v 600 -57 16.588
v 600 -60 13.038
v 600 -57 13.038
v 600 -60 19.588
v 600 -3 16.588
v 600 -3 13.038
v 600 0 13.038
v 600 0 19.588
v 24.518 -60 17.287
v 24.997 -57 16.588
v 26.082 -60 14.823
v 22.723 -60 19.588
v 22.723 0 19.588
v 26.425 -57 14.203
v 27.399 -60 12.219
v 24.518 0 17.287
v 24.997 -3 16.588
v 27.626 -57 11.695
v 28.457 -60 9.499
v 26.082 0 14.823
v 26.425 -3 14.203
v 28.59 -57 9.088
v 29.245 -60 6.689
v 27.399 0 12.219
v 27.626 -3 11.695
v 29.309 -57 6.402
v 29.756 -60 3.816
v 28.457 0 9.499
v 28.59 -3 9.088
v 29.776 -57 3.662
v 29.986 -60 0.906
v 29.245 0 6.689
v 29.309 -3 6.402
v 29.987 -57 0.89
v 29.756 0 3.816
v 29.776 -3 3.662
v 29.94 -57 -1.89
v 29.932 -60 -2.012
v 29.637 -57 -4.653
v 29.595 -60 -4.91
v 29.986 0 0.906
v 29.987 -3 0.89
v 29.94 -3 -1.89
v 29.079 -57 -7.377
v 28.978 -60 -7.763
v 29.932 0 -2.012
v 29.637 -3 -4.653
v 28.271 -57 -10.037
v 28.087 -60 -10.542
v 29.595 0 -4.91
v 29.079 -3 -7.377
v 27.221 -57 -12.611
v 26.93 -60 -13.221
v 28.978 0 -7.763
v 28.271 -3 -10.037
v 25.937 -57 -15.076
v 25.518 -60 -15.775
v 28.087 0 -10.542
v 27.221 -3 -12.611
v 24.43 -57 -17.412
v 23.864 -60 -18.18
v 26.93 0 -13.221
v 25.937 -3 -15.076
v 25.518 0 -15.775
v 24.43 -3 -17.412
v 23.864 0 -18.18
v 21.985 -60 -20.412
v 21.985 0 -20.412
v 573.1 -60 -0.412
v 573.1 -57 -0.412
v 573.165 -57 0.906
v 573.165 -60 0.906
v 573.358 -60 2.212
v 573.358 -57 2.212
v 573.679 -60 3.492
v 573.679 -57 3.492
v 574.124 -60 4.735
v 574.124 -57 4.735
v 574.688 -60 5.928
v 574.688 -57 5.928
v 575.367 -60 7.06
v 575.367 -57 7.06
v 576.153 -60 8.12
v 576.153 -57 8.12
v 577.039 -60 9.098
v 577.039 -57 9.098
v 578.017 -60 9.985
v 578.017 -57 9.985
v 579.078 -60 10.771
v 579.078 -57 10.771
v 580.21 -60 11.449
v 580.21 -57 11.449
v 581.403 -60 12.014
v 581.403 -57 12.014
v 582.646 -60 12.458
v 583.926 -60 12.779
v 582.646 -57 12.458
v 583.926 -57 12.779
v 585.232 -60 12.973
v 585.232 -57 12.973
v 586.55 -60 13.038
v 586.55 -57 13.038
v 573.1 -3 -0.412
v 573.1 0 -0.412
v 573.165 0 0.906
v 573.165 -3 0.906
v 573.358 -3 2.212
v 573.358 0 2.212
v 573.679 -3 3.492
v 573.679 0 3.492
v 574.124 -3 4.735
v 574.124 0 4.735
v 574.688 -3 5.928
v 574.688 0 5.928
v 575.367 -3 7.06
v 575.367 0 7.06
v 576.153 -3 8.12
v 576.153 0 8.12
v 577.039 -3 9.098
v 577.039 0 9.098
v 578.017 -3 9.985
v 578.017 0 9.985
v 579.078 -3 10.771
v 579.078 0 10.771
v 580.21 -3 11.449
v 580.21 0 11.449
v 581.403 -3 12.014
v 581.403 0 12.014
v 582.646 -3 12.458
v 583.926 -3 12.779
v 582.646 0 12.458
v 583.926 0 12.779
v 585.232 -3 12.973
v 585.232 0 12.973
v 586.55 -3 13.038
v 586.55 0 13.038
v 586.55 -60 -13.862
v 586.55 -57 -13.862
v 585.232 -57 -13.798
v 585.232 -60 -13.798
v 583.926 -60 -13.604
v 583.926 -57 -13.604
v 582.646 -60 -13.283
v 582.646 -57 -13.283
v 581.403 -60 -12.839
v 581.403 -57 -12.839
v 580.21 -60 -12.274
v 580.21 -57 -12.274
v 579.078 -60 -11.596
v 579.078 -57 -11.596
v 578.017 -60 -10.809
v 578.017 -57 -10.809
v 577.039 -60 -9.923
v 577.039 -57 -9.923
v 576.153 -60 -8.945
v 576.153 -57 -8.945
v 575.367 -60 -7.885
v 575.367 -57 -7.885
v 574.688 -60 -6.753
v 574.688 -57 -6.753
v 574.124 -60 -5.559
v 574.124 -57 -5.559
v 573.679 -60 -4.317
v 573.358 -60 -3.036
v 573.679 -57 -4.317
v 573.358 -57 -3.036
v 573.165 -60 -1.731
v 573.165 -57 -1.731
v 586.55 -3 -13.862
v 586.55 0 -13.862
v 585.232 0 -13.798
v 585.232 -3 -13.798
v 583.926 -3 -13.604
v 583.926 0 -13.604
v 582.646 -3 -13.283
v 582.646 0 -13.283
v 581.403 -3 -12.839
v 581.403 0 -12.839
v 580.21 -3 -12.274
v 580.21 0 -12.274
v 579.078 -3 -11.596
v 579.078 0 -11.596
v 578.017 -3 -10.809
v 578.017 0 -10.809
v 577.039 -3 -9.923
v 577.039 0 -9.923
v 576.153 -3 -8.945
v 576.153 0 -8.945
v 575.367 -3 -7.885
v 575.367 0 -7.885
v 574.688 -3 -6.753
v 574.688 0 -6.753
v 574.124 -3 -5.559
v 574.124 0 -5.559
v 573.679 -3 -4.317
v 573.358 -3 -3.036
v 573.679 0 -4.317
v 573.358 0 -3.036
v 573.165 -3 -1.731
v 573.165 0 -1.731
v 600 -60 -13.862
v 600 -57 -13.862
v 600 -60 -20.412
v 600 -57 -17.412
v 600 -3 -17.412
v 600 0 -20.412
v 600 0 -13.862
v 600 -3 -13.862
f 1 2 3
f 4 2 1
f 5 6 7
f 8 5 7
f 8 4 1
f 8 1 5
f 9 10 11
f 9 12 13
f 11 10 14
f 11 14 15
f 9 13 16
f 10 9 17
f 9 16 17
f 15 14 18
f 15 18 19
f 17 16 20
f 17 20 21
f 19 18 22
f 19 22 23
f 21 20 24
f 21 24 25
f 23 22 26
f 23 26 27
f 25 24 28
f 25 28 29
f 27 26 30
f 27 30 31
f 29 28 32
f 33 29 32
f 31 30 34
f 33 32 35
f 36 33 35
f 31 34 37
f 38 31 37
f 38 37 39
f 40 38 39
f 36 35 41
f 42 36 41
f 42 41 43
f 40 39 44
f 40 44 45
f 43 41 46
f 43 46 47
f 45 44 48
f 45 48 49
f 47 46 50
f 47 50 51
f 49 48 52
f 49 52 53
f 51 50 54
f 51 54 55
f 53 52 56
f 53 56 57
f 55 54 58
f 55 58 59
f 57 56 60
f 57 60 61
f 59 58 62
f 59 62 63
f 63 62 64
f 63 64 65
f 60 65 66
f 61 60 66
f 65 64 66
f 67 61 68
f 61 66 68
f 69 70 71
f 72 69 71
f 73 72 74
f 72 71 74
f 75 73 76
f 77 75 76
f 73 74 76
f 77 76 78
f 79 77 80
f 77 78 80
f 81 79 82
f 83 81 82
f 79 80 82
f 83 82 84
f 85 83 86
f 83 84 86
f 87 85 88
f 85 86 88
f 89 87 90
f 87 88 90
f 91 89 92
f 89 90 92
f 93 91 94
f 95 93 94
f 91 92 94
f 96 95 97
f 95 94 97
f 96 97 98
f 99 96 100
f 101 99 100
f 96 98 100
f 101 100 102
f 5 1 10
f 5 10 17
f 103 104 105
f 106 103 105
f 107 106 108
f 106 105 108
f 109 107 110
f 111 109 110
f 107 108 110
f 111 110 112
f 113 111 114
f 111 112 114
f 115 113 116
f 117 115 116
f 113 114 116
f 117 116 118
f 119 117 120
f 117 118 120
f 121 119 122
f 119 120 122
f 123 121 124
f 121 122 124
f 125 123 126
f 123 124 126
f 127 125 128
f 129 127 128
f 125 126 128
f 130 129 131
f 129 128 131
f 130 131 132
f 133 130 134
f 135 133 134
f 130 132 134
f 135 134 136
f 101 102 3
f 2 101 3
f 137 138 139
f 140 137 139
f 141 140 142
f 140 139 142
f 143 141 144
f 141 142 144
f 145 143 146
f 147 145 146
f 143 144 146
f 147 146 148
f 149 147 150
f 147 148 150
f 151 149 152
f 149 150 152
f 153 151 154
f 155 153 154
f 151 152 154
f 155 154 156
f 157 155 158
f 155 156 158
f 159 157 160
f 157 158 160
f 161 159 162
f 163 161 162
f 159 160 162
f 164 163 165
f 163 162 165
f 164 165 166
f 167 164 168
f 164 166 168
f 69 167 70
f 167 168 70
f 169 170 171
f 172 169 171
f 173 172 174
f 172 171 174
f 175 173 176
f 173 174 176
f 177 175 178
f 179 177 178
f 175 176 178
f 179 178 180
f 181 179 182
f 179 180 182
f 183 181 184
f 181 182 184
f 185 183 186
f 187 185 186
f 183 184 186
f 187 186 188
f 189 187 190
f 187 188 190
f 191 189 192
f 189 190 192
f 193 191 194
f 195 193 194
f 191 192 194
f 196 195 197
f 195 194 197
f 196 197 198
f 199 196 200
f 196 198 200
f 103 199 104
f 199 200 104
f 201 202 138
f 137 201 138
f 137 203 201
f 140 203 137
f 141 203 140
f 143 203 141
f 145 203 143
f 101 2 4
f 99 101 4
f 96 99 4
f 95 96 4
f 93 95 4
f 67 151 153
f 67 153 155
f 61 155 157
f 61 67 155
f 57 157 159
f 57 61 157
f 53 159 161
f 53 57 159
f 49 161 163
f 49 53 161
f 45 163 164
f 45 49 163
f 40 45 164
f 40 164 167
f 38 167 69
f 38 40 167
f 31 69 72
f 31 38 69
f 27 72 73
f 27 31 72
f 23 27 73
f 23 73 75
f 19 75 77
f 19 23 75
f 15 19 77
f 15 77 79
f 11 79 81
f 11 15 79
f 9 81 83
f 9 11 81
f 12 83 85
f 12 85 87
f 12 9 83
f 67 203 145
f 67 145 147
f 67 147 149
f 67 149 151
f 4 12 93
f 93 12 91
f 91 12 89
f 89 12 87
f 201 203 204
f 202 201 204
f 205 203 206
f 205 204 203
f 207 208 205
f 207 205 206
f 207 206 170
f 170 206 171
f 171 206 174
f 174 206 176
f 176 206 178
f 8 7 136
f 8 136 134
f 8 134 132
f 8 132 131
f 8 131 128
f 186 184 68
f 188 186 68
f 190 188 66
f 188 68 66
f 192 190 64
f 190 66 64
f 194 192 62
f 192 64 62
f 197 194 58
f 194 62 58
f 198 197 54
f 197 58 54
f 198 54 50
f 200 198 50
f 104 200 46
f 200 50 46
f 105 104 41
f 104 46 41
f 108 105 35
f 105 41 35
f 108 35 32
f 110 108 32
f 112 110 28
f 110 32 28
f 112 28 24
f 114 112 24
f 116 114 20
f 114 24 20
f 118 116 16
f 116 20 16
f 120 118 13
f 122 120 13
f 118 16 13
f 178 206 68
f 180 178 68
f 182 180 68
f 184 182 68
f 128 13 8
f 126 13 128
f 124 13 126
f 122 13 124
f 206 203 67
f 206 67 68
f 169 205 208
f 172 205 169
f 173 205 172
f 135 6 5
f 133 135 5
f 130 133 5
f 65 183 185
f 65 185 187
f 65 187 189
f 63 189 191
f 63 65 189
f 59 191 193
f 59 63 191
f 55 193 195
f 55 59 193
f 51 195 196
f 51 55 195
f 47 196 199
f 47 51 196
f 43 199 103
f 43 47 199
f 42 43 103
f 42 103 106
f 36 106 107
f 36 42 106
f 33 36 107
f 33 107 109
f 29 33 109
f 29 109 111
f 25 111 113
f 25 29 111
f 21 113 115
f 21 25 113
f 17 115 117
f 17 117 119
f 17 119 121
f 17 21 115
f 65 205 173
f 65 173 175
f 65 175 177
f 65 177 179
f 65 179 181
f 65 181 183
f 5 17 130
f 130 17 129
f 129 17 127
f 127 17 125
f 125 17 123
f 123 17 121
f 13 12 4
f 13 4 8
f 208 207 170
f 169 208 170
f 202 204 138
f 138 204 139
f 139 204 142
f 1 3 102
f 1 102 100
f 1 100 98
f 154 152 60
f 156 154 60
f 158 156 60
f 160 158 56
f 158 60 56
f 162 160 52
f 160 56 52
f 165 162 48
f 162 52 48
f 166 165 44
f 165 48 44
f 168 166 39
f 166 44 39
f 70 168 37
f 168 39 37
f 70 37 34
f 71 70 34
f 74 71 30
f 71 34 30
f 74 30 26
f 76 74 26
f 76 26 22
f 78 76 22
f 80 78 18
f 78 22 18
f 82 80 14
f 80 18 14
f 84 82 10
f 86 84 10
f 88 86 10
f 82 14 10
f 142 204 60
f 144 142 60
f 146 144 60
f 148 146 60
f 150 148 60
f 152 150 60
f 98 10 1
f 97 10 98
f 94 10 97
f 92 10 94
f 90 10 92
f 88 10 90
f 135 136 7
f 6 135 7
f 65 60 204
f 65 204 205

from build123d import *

# Parameters (mm, degrees)
F0_W     = 60
F0_H     = 40
F0_W_2   = 54
F0_H_2   = 34
F1_DEPTH = 600
F2_R     = 30
F3_DEPTH = 60
F4_DEPTH = 25


with BuildPart() as f1:
    # F0 (on Right) → F1 (new body)
    with BuildSketch(Plane.YZ):
        with Locations((-30, -0.412365)):
            Rectangle(F0_W, F0_H)
        with Locations((-30, -0.412365)):
            Rectangle(F0_W_2, F0_H_2, mode=Mode.SUBTRACT)
    extrude(amount=F1_DEPTH)

    # F2 (on face) → F3 (cut)
    with BuildSketch(Plane(origin=(0, 0, 0), x_dir=(-1, 0, 0), z_dir=(0, 1, 0))):
        with BuildLine():
            ThreePointArc((-586.55, -13.862365), (-577.039414, -9.922951), (-573.1, -0.412365))
            ThreePointArc((-573.1, -0.412365), (-577.039414, 9.098221), (-586.55, 13.037635))
            ThreePointArc((-586.55, 13.037635), (-600, -0.412365), (-586.55, -13.862365))
        make_face()
        Circle(F2_R)
        with BuildLine():
            ThreePointArc((-600, -0.412365), (-596.060586, 9.098221), (-586.55, 13.037635))
            Line((-586.55, 13.037635), (-600, 13.037635))
            Line((-600, 13.037635), (-600, -0.412365))
        make_face()
        with BuildLine():
            Line((-600, -13.862365), (-586.55, -13.862365))
            ThreePointArc((-586.55, -13.862365), (-596.060586, -9.922951), (-600, -0.412365))
            Line((-600, -0.412365), (-600, -13.862365))
        make_face()
    extrude(amount=-F3_DEPTH, mode=Mode.SUBTRACT)

    # F2 (on face) → F4 (cut)
    with BuildSketch(Plane(origin=(0, 0, 0), x_dir=(-1, 0, 0), z_dir=(0, 1, 0))):
        with BuildLine():
            ThreePointArc((-586.55, -13.862365), (-577.039414, -9.922951), (-573.1, -0.412365))
            ThreePointArc((-573.1, -0.412365), (-577.039414, 9.098221), (-586.55, 13.037635))
            ThreePointArc((-586.55, 13.037635), (-600, -0.412365), (-586.55, -13.862365))
        make_face()
        Circle(F2_R)
    extrude(amount=-F4_DEPTH, mode=Mode.SUBTRACT)


solid = f1.part
